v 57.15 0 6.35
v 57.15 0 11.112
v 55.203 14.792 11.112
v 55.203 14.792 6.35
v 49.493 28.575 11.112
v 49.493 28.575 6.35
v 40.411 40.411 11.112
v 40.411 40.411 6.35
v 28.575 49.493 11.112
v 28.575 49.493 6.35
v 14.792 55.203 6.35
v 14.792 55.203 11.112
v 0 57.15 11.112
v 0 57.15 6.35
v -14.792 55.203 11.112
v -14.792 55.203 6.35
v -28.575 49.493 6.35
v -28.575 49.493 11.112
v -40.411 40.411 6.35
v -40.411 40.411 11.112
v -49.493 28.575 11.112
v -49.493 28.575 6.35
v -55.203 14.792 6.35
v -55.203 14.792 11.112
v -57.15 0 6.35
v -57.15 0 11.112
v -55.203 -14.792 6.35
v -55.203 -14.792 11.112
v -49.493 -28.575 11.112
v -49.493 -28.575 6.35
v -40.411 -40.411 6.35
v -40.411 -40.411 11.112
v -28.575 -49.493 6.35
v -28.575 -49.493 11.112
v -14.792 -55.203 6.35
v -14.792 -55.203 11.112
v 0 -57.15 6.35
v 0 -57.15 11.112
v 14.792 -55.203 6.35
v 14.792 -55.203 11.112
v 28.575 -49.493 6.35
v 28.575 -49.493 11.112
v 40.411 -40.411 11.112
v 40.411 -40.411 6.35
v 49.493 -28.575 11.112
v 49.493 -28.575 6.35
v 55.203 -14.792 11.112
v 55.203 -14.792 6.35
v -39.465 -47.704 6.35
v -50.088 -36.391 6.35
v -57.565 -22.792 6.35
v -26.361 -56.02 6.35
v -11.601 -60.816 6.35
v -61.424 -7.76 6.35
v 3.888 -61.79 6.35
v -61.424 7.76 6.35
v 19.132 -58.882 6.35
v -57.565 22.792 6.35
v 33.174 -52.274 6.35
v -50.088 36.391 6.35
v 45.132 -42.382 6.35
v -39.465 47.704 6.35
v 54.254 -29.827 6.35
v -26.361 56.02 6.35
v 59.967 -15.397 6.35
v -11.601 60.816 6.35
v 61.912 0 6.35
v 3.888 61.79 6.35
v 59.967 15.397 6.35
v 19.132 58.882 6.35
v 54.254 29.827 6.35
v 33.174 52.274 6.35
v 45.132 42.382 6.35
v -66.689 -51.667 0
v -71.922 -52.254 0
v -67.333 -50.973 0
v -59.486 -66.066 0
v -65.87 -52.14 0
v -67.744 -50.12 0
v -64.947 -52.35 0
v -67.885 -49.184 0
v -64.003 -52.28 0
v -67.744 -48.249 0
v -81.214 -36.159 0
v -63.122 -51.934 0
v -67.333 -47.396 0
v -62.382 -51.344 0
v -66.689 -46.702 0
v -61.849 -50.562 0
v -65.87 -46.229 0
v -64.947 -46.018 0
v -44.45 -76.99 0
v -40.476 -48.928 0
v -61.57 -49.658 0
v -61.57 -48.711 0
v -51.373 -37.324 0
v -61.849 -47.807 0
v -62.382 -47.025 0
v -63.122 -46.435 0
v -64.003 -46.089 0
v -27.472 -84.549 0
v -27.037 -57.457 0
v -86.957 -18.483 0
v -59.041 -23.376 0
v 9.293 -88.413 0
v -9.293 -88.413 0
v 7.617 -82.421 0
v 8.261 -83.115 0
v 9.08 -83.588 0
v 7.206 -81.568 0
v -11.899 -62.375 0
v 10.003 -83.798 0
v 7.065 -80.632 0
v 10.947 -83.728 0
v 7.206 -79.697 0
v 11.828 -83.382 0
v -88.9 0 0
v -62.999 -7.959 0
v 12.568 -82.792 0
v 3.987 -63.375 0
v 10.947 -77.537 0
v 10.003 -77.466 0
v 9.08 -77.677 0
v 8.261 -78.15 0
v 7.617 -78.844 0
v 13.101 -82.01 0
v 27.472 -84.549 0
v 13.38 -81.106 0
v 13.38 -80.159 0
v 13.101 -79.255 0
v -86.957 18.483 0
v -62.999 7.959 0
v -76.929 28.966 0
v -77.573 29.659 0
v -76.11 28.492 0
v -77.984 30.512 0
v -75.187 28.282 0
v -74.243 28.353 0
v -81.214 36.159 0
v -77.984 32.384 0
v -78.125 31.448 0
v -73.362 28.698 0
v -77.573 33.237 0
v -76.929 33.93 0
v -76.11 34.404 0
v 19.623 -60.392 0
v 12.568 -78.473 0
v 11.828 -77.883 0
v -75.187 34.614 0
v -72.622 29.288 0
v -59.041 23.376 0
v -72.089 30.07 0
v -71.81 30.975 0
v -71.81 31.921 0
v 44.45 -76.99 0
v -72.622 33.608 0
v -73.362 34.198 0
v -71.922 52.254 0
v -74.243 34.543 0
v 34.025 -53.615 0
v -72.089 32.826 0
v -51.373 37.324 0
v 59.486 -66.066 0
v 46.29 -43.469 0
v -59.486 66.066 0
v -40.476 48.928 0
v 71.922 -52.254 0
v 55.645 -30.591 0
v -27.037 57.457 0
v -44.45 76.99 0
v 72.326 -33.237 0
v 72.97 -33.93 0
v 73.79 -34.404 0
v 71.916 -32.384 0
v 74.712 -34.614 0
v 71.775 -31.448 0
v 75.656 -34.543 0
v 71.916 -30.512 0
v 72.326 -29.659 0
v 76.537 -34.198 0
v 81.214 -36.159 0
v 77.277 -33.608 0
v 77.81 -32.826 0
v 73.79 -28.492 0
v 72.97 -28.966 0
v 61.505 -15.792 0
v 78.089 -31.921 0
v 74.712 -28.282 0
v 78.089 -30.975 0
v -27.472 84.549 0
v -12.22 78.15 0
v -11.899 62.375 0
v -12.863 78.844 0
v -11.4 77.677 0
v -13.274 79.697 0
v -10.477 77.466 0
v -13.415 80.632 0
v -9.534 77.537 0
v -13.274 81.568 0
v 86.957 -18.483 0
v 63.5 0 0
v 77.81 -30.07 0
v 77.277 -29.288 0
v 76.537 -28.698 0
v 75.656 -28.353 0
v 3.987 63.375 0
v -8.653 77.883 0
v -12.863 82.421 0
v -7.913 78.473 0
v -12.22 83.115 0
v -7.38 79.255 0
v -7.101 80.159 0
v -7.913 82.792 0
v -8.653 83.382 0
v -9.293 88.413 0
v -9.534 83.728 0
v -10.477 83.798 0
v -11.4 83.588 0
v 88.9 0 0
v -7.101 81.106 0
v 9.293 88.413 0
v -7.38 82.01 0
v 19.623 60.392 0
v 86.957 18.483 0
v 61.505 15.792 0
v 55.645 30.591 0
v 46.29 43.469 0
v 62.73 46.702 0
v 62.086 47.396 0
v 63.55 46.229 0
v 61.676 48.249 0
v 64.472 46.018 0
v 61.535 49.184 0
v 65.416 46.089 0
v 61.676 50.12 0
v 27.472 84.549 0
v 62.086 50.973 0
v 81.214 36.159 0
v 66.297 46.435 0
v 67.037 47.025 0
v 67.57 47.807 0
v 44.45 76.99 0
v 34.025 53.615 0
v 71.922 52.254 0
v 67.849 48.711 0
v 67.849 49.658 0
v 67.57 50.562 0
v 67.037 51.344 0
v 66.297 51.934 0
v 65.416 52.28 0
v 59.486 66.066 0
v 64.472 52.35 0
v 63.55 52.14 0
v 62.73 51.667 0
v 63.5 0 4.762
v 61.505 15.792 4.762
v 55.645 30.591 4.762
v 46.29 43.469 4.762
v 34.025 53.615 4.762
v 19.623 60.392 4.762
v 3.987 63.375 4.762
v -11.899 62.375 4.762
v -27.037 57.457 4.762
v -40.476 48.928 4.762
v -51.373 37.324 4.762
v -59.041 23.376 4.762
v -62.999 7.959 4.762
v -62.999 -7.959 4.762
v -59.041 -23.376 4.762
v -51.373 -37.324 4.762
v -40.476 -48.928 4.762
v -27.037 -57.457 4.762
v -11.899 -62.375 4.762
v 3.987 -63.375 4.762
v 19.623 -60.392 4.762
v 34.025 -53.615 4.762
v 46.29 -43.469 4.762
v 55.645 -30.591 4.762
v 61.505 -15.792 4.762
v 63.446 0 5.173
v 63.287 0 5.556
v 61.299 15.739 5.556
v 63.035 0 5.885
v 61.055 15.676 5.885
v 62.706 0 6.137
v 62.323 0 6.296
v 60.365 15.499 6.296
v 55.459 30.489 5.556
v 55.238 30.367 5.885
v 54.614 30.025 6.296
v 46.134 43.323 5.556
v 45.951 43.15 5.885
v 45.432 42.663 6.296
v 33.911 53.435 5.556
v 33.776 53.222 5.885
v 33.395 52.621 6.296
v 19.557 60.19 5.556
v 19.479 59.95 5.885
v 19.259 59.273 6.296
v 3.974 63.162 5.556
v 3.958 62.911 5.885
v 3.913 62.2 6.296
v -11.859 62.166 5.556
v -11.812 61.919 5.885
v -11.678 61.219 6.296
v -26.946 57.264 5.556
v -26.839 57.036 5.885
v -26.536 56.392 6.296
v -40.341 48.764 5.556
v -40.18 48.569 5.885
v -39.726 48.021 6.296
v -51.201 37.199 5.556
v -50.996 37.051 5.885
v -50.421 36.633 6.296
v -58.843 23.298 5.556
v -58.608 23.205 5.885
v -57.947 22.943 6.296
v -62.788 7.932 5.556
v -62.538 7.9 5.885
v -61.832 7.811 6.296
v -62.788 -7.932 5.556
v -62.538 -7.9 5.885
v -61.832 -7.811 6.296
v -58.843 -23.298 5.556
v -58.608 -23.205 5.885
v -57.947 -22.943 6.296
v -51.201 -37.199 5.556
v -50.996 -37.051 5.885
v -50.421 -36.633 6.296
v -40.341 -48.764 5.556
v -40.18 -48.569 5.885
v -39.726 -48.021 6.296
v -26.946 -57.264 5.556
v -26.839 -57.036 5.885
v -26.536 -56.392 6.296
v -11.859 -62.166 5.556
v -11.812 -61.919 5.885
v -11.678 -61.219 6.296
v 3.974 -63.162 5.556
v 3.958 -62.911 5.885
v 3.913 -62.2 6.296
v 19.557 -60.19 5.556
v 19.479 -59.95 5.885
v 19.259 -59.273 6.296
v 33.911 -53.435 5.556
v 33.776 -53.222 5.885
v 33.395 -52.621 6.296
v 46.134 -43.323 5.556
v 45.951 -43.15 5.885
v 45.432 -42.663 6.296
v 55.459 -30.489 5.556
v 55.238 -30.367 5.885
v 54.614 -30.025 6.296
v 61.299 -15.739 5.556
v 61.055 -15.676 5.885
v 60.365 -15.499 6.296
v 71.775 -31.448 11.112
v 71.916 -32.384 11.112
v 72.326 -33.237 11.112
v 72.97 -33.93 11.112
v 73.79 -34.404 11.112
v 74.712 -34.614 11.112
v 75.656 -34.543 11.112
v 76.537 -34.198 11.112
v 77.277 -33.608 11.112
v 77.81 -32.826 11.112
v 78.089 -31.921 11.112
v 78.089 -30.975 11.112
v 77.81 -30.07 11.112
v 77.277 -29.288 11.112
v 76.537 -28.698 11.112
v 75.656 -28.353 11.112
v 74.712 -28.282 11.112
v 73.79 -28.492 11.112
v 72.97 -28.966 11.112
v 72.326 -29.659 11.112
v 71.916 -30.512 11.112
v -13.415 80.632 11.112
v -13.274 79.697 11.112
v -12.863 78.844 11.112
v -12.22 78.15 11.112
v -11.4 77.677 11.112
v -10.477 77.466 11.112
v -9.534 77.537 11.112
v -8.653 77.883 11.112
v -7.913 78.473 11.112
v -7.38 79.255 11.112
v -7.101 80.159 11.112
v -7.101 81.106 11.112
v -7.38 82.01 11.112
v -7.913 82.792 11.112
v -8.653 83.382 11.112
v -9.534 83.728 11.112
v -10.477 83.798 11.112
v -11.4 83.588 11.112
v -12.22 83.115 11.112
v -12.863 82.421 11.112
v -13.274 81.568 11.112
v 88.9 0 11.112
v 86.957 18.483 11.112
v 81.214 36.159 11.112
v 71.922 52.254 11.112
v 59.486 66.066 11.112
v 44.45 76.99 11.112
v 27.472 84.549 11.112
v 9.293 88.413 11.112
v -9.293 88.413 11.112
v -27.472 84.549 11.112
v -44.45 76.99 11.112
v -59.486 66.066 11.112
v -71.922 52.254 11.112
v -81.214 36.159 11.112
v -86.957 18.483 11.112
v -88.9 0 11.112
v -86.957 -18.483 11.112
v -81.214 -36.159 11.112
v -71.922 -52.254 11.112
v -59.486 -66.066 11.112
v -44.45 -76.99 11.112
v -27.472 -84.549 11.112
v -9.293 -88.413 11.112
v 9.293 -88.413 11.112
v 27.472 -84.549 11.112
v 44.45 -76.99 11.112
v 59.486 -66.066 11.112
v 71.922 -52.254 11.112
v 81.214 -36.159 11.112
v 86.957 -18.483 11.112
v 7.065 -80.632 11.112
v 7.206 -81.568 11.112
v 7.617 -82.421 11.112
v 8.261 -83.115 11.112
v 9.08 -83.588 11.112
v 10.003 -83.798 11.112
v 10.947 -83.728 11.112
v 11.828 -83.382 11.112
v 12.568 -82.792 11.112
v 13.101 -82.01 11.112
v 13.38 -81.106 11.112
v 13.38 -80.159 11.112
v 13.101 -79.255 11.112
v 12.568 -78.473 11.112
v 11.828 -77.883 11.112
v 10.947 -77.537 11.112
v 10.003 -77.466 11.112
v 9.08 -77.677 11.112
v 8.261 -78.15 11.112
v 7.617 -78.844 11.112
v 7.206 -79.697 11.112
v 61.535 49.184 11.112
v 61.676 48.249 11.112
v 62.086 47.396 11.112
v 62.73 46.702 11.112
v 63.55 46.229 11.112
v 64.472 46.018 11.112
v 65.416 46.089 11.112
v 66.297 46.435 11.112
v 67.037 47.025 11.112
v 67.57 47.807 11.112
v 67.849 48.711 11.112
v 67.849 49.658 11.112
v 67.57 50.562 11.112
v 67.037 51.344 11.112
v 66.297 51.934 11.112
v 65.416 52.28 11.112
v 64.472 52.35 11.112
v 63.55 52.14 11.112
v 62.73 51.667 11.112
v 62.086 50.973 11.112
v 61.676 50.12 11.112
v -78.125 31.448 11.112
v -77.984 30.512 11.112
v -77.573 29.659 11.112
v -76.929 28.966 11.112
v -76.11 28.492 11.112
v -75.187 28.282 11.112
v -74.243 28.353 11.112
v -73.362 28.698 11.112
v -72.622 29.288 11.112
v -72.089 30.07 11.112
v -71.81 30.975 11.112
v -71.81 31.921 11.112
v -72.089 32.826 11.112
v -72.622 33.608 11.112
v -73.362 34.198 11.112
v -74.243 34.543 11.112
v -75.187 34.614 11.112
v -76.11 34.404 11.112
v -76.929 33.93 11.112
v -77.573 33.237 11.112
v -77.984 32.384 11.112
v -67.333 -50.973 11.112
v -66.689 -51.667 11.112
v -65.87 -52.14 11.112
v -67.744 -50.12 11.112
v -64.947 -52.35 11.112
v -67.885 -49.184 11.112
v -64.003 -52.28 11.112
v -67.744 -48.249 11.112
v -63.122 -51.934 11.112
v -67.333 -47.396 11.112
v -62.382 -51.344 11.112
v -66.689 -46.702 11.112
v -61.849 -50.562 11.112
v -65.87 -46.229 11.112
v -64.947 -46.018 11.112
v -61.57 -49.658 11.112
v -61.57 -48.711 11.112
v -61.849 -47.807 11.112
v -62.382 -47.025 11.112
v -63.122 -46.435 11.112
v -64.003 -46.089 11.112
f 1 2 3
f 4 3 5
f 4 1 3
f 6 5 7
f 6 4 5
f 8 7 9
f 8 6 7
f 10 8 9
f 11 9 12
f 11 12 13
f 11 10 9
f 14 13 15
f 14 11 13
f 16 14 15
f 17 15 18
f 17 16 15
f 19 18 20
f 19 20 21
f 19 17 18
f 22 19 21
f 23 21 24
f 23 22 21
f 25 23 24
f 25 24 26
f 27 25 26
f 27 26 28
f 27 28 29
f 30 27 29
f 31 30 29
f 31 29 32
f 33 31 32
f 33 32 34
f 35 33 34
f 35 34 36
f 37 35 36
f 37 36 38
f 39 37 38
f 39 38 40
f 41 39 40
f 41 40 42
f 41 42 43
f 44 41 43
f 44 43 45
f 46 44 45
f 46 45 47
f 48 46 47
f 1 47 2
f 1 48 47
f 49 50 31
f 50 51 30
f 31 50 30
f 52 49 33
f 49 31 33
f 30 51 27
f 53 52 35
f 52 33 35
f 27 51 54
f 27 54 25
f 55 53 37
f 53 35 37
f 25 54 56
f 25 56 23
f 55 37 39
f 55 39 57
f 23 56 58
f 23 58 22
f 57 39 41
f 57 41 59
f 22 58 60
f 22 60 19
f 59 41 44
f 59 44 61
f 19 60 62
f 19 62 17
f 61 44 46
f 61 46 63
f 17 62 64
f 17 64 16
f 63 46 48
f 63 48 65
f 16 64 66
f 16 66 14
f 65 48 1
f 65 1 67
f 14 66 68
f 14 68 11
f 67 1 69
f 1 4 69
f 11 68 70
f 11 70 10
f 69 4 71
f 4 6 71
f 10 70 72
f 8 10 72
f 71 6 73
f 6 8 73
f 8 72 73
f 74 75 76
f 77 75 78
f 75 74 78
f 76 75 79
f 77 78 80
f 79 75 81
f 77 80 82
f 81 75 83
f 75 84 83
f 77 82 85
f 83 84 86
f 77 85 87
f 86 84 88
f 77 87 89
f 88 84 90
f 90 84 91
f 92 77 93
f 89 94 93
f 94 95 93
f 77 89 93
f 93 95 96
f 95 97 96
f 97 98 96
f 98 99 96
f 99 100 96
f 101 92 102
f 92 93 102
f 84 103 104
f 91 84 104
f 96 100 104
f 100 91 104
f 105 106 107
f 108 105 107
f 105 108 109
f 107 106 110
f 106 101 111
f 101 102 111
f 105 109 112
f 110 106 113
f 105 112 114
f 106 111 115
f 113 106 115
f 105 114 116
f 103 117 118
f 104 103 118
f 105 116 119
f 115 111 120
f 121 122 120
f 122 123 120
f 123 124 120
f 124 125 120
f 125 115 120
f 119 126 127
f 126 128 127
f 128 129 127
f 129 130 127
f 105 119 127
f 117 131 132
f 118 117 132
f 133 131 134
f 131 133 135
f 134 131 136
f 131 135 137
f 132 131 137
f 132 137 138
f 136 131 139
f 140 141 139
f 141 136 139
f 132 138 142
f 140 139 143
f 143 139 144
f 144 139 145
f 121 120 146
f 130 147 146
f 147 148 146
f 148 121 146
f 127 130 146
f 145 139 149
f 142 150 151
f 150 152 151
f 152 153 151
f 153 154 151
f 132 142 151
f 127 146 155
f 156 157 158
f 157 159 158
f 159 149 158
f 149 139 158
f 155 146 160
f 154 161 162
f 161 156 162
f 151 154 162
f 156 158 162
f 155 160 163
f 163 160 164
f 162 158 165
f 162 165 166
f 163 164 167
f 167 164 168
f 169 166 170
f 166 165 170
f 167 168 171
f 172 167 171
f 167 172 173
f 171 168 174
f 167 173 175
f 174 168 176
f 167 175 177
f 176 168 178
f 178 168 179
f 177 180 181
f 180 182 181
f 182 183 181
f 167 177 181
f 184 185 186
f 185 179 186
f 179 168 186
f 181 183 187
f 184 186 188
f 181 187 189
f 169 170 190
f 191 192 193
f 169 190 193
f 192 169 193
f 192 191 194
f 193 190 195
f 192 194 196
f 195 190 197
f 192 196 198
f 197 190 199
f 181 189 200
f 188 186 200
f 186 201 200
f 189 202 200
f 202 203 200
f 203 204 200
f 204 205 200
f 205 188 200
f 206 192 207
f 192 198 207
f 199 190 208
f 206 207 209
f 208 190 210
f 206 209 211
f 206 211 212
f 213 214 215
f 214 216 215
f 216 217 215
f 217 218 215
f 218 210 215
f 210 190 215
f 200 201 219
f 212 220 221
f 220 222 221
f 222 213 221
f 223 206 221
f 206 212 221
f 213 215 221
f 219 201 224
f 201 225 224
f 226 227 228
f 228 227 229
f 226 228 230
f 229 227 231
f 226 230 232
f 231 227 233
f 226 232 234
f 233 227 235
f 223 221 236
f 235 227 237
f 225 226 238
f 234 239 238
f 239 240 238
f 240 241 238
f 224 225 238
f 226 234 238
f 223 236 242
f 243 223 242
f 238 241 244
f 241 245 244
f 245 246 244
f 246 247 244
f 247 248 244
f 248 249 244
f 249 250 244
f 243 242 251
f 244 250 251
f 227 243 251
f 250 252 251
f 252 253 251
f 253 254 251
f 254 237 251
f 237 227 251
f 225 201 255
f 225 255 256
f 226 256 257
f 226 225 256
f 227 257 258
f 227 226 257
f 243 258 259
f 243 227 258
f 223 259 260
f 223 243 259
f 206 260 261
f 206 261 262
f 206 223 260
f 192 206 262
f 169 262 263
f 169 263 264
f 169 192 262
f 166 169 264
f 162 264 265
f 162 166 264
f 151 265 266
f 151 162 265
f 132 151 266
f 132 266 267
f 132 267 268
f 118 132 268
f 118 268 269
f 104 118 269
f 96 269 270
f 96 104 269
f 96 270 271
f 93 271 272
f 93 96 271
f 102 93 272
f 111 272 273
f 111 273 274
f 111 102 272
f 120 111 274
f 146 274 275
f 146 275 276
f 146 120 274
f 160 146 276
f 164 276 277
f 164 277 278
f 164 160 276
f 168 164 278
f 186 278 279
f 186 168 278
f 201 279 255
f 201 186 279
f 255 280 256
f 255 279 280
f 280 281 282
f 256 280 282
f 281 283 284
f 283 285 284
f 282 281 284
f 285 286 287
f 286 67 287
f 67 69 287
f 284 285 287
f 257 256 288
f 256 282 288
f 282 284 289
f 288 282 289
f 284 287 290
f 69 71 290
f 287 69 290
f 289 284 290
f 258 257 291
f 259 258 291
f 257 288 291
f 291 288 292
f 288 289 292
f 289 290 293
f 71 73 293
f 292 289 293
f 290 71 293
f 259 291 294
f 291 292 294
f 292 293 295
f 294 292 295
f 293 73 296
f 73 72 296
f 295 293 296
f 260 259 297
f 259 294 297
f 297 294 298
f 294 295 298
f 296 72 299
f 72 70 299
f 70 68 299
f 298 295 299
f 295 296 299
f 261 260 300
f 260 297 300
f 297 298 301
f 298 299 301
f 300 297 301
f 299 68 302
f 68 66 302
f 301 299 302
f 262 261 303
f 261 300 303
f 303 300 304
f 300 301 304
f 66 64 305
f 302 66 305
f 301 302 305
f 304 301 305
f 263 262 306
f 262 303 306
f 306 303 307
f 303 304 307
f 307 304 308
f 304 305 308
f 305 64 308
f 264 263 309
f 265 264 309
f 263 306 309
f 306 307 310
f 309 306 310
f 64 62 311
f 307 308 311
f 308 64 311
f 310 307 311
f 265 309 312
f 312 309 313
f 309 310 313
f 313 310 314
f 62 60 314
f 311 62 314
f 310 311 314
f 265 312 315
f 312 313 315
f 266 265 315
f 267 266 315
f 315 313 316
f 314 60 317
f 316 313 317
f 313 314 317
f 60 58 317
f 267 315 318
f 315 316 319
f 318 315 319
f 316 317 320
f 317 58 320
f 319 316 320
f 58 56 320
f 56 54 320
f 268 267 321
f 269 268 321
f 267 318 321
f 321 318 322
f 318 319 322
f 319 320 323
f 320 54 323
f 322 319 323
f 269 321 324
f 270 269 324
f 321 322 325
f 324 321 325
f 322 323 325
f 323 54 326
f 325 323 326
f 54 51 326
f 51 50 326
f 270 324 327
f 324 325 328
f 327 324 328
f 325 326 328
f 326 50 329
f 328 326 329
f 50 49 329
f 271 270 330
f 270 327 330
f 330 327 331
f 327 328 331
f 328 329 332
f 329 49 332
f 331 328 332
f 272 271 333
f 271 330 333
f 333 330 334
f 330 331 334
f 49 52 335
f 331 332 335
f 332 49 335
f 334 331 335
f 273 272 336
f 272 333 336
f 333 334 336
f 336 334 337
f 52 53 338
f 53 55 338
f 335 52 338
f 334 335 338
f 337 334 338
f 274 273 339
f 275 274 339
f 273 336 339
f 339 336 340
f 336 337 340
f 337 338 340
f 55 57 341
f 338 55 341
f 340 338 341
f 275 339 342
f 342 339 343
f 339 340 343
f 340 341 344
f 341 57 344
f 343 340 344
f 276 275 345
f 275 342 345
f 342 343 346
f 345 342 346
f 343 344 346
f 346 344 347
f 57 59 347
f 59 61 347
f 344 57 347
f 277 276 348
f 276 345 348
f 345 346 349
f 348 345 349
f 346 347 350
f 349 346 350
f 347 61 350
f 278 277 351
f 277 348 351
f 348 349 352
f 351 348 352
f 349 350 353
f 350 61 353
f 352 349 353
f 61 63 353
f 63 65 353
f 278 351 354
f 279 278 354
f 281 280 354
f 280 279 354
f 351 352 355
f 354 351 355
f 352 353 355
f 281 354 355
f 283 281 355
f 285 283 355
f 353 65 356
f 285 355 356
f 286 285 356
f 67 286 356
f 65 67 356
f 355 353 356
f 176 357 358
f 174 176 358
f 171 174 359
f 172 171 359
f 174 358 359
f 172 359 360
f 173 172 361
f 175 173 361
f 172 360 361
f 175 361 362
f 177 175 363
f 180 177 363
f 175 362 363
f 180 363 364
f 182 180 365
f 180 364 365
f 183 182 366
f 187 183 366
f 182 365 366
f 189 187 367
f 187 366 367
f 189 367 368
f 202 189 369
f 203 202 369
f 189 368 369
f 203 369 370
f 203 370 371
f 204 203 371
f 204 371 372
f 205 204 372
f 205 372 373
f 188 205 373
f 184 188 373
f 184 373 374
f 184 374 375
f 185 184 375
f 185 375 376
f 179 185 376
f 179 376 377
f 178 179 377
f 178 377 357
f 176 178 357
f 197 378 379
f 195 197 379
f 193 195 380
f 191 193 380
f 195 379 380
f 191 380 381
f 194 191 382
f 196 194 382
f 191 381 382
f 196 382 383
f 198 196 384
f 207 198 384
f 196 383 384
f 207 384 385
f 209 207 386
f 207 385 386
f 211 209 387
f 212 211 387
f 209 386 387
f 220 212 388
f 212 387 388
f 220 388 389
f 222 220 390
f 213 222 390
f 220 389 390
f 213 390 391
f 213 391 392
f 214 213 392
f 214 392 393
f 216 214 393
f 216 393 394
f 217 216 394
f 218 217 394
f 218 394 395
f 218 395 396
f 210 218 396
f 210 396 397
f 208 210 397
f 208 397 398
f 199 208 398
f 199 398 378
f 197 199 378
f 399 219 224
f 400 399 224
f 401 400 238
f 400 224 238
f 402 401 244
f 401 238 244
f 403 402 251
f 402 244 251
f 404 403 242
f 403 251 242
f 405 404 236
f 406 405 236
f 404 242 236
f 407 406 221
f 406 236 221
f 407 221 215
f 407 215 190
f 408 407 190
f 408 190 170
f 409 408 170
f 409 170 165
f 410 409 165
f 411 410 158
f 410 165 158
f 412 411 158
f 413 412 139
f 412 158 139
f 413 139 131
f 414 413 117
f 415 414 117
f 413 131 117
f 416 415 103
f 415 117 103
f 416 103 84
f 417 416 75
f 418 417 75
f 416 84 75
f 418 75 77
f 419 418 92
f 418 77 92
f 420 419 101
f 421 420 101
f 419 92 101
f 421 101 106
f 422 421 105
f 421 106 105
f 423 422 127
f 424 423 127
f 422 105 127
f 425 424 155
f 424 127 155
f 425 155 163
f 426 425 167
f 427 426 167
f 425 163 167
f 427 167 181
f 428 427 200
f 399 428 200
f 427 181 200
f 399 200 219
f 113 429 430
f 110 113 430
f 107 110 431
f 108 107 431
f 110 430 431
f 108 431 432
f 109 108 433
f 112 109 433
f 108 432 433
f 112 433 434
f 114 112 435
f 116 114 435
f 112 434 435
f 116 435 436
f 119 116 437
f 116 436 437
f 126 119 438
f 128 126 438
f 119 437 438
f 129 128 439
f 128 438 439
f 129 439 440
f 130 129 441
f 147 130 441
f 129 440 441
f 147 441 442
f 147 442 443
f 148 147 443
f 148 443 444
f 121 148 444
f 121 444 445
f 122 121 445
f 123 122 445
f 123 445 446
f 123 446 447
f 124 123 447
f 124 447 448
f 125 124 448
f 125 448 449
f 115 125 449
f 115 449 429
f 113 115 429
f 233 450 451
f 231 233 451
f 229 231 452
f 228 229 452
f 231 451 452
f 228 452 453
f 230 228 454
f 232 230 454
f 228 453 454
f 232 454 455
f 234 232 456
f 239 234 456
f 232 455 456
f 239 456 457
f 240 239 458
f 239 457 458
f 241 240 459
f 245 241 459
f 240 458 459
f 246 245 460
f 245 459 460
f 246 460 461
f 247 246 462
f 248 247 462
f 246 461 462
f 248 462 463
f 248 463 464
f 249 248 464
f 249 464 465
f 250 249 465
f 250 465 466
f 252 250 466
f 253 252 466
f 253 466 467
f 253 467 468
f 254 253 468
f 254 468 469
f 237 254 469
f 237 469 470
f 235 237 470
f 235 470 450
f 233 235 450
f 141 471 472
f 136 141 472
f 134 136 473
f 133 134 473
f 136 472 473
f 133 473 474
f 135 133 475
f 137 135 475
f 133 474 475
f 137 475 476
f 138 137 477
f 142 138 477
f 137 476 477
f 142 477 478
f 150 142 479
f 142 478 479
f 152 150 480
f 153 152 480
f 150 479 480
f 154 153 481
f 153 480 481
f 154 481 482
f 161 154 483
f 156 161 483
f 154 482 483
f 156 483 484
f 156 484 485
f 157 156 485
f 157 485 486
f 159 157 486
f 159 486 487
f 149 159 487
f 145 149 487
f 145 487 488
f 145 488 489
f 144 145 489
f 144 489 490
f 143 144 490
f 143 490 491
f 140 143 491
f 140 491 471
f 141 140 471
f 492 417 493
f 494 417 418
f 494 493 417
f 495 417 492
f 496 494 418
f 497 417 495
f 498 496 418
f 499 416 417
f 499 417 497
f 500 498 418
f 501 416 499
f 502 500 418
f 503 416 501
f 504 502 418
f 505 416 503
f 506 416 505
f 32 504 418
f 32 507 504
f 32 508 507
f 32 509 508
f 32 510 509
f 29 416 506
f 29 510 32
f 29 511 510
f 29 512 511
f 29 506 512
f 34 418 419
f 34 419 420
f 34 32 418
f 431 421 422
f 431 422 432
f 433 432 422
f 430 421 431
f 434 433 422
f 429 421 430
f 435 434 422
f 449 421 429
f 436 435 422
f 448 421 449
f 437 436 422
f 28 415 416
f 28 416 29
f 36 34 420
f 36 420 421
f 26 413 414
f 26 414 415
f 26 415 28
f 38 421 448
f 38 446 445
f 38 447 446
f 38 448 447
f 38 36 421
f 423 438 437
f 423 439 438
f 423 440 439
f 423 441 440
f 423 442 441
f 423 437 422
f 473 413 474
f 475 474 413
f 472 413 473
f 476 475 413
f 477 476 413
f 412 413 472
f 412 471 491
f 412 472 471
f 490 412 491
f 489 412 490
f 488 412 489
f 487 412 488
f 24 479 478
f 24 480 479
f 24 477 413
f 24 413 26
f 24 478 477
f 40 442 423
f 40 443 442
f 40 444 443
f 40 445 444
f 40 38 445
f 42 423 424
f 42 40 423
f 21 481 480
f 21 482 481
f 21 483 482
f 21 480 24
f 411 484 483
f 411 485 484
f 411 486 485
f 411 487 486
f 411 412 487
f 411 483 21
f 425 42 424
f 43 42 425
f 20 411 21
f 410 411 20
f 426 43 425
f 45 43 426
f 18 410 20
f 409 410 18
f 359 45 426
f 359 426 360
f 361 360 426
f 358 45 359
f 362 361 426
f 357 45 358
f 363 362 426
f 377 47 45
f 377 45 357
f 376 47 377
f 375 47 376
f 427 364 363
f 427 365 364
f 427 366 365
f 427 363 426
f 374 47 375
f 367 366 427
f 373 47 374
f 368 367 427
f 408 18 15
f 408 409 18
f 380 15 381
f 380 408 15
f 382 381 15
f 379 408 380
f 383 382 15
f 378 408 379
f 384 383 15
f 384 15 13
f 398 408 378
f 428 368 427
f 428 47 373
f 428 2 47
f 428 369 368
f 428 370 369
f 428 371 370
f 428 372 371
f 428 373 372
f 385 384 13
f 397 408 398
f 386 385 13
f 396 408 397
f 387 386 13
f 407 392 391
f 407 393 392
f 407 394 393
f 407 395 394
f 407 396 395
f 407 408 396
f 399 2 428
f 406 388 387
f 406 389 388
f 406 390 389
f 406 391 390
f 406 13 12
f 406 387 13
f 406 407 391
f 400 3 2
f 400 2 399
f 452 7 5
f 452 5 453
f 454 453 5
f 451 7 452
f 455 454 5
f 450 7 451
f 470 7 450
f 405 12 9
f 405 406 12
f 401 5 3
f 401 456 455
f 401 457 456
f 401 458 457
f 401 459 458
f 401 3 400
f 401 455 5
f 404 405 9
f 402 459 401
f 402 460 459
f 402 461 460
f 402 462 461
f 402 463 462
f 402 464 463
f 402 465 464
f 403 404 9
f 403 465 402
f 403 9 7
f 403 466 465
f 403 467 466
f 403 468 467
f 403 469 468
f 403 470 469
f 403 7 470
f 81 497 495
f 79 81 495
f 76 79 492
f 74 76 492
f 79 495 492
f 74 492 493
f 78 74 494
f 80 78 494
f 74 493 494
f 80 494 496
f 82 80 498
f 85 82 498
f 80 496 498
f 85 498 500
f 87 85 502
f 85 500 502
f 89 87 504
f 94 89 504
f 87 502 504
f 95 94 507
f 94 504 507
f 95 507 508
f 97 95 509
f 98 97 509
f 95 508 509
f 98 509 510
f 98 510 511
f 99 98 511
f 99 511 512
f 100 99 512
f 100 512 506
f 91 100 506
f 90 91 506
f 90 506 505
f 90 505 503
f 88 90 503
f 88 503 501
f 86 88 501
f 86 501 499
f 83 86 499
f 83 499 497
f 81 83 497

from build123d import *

# Parameters (mm, degrees)
F0_R     = 88.9
F0_R_2   = 57.15
F1_DEPTH = 11.1125
F2_R     = 63.5
F3_DEPTH = 6.35
F5_D     = 6.35
F6_R     = 1.5875


with BuildPart() as f1:
    # F0 (on Top) → F1 (new body)
    with BuildSketch(Plane.XY):
        Circle(F0_R)
        Circle(F0_R_2, mode=Mode.SUBTRACT)
    extrude(amount=F1_DEPTH)

    # F2 (on Top) → F3 (cut)
    with BuildSketch(Plane.XY):
        Circle(F2_R)
    extrude(amount=F3_DEPTH, mode=Mode.SUBTRACT)

    # F5 (through all)
    with Locations(Plane(origin=(0, 0, 0), x_dir=(1, 0, 0), z_dir=(0, 0, -1))):
        with Locations((10.2400904958, 80.6323690997), (-64.7096347598, 49.1843630563), (-74.9497252556, -31.4480060434), (-10.2400904958, -80.6323690997), (64.7096347598, -49.1843630563), (74.9497252556, 31.4480060434)):
            Hole(F5_D / 2)

    # F6
    f6_edges = [f1.edges().sort_by_distance(p)[0] for p in [
        (-63.5, 0, 6.35),
    ]]
    fillet(f6_edges, radius=F6_R)


solid = f1.part
